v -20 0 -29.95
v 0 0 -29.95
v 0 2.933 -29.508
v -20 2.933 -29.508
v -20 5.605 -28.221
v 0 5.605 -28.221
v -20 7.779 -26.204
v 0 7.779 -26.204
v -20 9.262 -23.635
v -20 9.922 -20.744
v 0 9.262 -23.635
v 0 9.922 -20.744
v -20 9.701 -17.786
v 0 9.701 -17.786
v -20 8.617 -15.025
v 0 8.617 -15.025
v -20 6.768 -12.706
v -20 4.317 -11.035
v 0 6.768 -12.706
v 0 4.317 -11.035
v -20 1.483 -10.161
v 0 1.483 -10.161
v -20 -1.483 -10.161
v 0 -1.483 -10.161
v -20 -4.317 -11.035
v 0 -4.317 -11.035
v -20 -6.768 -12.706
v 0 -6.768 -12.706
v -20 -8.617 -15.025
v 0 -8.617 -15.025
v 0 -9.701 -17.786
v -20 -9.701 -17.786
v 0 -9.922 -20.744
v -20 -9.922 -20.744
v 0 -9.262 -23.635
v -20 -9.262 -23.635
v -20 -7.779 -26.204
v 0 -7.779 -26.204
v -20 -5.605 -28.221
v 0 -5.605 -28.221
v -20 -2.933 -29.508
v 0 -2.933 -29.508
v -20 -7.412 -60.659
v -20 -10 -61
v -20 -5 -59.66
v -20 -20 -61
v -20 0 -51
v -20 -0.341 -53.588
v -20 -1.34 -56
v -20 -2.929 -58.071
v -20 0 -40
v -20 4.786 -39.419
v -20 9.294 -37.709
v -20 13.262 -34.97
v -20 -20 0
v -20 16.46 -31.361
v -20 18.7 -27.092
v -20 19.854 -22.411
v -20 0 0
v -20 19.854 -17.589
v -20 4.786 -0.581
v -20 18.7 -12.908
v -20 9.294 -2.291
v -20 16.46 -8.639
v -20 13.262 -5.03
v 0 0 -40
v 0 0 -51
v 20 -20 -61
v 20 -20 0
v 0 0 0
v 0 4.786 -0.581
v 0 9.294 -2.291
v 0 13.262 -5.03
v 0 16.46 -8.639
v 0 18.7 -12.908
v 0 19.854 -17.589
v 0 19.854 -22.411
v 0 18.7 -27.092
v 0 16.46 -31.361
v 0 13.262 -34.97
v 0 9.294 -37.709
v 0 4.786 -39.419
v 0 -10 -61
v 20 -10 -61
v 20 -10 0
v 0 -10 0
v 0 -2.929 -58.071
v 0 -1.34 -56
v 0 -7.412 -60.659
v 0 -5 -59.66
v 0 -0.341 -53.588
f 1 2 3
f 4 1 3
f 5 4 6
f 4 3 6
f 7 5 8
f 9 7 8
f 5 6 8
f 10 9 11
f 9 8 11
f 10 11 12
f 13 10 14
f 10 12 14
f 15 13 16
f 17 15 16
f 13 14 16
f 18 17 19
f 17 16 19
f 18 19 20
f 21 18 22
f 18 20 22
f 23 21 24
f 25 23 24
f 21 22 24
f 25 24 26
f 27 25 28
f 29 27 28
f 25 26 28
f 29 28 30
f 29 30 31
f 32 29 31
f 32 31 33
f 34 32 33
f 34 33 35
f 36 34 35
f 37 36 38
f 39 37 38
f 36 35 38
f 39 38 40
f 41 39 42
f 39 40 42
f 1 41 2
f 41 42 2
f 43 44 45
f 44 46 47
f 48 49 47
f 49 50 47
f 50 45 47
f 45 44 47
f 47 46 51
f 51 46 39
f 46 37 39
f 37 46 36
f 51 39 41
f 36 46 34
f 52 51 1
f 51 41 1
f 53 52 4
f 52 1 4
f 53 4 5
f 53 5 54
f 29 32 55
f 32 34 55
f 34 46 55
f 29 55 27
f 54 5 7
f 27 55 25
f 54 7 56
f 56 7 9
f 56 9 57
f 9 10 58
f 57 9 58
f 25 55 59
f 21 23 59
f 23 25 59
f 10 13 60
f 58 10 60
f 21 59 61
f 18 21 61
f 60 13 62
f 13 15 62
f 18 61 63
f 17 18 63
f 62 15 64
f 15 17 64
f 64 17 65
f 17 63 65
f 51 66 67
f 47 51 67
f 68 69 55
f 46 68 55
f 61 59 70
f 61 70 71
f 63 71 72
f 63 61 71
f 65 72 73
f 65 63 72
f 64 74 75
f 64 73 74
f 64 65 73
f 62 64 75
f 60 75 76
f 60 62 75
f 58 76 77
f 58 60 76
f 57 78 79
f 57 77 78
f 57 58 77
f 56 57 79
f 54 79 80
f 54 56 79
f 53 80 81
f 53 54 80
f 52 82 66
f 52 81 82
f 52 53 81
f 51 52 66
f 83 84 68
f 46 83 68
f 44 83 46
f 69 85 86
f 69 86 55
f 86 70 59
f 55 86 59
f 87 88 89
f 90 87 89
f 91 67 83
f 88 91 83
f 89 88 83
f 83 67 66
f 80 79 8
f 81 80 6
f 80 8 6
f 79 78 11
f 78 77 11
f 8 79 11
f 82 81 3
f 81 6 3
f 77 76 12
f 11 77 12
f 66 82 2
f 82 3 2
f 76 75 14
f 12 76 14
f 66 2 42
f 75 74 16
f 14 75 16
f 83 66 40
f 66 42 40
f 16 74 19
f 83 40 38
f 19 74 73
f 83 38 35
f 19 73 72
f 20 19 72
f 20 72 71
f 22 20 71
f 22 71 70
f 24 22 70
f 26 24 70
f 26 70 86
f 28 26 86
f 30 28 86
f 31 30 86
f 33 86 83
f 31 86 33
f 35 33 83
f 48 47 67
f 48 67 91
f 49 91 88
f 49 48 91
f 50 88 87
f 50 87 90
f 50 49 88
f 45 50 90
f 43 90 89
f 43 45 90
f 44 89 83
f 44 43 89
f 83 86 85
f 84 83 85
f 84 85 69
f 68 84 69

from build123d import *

# Parameters (mm, degrees)
BOSS_EXTRUDE1_DEPTH     = 61
CUT_EXTRUDE2_DEPTH      = 68.238381896
CUT_EXTRUDE2_DEPTH_BACK = 20
SKETCH3_R               = 9.95
CUT_EXTRUDE3_DEPTH      = 20
CUT_EXTRUDE7_START      = -20
CUT_EXTRUDE7_DEPTH      = 20


# Read off the part's stored shape, not the designer's step: Cut-Extrude7
with BuildPart() as part:
    # Sketch1 → Boss-Extrude1 (new body)
    with BuildSketch(Plane.XY):
        Polygon((0, -10), (20, -10), (20, -20), (-20, -20), (-20, 20), (0, 20), align=None)
    extrude(amount=-BOSS_EXTRUDE1_DEPTH)

    # Sketch2 → Cut-Extrude2 (cut, two sides: drawn at the far end of the back side and taken through both)
    with BuildSketch(Plane(origin=(0, 0, 0), x_dir=(0, 0, -1), z_dir=(1, 0, 0)).offset(-CUT_EXTRUDE2_DEPTH_BACK)):
        with BuildLine():
            Line((0, -138.390030766), (0, 0))
            ThreePointArc((0, 0), (20, 20), (40, 0))
            Line((40, 0), (61, 0))
            Line((61, 0), (199.390030766, 0))
            Line((199.390030766, 0), (41.573756452, 227.379036023))
            Line((41.573756452, 227.379036023), (-157.816274314, 88.989005258))
            Line((-157.816274314, 88.989005258), (0, -138.390030766))
        make_face()
    extrude(amount=CUT_EXTRUDE2_DEPTH + CUT_EXTRUDE2_DEPTH_BACK, mode=Mode.SUBTRACT)

    # Sketch3 → Cut-Extrude3 (cut)
    with BuildSketch(Plane(origin=(0, 0, 0), x_dir=(0, 0, -1), z_dir=(1, 0, 0))):
        with Locations((20, 0)):
            Circle(SKETCH3_R)
    extrude(amount=-CUT_EXTRUDE3_DEPTH, mode=Mode.SUBTRACT)

    # Cut-Extrude7 outline → Cut-Extrude7 (cut)
    with BuildSketch(Plane(origin=(0, 0, 0), x_dir=(0, 0, -1), z_dir=(1, 0, 0)).offset(CUT_EXTRUDE7_START)):
        with BuildLine():
            Line((61, 0), (51, 0))
            ThreePointArc((51, 0), (58.071067812, -2.928932188), (61, -10))
            Line((61, -10), (61, 0))
        make_face()
    extrude(amount=CUT_EXTRUDE7_DEPTH, mode=Mode.SUBTRACT)


solid = part.part
